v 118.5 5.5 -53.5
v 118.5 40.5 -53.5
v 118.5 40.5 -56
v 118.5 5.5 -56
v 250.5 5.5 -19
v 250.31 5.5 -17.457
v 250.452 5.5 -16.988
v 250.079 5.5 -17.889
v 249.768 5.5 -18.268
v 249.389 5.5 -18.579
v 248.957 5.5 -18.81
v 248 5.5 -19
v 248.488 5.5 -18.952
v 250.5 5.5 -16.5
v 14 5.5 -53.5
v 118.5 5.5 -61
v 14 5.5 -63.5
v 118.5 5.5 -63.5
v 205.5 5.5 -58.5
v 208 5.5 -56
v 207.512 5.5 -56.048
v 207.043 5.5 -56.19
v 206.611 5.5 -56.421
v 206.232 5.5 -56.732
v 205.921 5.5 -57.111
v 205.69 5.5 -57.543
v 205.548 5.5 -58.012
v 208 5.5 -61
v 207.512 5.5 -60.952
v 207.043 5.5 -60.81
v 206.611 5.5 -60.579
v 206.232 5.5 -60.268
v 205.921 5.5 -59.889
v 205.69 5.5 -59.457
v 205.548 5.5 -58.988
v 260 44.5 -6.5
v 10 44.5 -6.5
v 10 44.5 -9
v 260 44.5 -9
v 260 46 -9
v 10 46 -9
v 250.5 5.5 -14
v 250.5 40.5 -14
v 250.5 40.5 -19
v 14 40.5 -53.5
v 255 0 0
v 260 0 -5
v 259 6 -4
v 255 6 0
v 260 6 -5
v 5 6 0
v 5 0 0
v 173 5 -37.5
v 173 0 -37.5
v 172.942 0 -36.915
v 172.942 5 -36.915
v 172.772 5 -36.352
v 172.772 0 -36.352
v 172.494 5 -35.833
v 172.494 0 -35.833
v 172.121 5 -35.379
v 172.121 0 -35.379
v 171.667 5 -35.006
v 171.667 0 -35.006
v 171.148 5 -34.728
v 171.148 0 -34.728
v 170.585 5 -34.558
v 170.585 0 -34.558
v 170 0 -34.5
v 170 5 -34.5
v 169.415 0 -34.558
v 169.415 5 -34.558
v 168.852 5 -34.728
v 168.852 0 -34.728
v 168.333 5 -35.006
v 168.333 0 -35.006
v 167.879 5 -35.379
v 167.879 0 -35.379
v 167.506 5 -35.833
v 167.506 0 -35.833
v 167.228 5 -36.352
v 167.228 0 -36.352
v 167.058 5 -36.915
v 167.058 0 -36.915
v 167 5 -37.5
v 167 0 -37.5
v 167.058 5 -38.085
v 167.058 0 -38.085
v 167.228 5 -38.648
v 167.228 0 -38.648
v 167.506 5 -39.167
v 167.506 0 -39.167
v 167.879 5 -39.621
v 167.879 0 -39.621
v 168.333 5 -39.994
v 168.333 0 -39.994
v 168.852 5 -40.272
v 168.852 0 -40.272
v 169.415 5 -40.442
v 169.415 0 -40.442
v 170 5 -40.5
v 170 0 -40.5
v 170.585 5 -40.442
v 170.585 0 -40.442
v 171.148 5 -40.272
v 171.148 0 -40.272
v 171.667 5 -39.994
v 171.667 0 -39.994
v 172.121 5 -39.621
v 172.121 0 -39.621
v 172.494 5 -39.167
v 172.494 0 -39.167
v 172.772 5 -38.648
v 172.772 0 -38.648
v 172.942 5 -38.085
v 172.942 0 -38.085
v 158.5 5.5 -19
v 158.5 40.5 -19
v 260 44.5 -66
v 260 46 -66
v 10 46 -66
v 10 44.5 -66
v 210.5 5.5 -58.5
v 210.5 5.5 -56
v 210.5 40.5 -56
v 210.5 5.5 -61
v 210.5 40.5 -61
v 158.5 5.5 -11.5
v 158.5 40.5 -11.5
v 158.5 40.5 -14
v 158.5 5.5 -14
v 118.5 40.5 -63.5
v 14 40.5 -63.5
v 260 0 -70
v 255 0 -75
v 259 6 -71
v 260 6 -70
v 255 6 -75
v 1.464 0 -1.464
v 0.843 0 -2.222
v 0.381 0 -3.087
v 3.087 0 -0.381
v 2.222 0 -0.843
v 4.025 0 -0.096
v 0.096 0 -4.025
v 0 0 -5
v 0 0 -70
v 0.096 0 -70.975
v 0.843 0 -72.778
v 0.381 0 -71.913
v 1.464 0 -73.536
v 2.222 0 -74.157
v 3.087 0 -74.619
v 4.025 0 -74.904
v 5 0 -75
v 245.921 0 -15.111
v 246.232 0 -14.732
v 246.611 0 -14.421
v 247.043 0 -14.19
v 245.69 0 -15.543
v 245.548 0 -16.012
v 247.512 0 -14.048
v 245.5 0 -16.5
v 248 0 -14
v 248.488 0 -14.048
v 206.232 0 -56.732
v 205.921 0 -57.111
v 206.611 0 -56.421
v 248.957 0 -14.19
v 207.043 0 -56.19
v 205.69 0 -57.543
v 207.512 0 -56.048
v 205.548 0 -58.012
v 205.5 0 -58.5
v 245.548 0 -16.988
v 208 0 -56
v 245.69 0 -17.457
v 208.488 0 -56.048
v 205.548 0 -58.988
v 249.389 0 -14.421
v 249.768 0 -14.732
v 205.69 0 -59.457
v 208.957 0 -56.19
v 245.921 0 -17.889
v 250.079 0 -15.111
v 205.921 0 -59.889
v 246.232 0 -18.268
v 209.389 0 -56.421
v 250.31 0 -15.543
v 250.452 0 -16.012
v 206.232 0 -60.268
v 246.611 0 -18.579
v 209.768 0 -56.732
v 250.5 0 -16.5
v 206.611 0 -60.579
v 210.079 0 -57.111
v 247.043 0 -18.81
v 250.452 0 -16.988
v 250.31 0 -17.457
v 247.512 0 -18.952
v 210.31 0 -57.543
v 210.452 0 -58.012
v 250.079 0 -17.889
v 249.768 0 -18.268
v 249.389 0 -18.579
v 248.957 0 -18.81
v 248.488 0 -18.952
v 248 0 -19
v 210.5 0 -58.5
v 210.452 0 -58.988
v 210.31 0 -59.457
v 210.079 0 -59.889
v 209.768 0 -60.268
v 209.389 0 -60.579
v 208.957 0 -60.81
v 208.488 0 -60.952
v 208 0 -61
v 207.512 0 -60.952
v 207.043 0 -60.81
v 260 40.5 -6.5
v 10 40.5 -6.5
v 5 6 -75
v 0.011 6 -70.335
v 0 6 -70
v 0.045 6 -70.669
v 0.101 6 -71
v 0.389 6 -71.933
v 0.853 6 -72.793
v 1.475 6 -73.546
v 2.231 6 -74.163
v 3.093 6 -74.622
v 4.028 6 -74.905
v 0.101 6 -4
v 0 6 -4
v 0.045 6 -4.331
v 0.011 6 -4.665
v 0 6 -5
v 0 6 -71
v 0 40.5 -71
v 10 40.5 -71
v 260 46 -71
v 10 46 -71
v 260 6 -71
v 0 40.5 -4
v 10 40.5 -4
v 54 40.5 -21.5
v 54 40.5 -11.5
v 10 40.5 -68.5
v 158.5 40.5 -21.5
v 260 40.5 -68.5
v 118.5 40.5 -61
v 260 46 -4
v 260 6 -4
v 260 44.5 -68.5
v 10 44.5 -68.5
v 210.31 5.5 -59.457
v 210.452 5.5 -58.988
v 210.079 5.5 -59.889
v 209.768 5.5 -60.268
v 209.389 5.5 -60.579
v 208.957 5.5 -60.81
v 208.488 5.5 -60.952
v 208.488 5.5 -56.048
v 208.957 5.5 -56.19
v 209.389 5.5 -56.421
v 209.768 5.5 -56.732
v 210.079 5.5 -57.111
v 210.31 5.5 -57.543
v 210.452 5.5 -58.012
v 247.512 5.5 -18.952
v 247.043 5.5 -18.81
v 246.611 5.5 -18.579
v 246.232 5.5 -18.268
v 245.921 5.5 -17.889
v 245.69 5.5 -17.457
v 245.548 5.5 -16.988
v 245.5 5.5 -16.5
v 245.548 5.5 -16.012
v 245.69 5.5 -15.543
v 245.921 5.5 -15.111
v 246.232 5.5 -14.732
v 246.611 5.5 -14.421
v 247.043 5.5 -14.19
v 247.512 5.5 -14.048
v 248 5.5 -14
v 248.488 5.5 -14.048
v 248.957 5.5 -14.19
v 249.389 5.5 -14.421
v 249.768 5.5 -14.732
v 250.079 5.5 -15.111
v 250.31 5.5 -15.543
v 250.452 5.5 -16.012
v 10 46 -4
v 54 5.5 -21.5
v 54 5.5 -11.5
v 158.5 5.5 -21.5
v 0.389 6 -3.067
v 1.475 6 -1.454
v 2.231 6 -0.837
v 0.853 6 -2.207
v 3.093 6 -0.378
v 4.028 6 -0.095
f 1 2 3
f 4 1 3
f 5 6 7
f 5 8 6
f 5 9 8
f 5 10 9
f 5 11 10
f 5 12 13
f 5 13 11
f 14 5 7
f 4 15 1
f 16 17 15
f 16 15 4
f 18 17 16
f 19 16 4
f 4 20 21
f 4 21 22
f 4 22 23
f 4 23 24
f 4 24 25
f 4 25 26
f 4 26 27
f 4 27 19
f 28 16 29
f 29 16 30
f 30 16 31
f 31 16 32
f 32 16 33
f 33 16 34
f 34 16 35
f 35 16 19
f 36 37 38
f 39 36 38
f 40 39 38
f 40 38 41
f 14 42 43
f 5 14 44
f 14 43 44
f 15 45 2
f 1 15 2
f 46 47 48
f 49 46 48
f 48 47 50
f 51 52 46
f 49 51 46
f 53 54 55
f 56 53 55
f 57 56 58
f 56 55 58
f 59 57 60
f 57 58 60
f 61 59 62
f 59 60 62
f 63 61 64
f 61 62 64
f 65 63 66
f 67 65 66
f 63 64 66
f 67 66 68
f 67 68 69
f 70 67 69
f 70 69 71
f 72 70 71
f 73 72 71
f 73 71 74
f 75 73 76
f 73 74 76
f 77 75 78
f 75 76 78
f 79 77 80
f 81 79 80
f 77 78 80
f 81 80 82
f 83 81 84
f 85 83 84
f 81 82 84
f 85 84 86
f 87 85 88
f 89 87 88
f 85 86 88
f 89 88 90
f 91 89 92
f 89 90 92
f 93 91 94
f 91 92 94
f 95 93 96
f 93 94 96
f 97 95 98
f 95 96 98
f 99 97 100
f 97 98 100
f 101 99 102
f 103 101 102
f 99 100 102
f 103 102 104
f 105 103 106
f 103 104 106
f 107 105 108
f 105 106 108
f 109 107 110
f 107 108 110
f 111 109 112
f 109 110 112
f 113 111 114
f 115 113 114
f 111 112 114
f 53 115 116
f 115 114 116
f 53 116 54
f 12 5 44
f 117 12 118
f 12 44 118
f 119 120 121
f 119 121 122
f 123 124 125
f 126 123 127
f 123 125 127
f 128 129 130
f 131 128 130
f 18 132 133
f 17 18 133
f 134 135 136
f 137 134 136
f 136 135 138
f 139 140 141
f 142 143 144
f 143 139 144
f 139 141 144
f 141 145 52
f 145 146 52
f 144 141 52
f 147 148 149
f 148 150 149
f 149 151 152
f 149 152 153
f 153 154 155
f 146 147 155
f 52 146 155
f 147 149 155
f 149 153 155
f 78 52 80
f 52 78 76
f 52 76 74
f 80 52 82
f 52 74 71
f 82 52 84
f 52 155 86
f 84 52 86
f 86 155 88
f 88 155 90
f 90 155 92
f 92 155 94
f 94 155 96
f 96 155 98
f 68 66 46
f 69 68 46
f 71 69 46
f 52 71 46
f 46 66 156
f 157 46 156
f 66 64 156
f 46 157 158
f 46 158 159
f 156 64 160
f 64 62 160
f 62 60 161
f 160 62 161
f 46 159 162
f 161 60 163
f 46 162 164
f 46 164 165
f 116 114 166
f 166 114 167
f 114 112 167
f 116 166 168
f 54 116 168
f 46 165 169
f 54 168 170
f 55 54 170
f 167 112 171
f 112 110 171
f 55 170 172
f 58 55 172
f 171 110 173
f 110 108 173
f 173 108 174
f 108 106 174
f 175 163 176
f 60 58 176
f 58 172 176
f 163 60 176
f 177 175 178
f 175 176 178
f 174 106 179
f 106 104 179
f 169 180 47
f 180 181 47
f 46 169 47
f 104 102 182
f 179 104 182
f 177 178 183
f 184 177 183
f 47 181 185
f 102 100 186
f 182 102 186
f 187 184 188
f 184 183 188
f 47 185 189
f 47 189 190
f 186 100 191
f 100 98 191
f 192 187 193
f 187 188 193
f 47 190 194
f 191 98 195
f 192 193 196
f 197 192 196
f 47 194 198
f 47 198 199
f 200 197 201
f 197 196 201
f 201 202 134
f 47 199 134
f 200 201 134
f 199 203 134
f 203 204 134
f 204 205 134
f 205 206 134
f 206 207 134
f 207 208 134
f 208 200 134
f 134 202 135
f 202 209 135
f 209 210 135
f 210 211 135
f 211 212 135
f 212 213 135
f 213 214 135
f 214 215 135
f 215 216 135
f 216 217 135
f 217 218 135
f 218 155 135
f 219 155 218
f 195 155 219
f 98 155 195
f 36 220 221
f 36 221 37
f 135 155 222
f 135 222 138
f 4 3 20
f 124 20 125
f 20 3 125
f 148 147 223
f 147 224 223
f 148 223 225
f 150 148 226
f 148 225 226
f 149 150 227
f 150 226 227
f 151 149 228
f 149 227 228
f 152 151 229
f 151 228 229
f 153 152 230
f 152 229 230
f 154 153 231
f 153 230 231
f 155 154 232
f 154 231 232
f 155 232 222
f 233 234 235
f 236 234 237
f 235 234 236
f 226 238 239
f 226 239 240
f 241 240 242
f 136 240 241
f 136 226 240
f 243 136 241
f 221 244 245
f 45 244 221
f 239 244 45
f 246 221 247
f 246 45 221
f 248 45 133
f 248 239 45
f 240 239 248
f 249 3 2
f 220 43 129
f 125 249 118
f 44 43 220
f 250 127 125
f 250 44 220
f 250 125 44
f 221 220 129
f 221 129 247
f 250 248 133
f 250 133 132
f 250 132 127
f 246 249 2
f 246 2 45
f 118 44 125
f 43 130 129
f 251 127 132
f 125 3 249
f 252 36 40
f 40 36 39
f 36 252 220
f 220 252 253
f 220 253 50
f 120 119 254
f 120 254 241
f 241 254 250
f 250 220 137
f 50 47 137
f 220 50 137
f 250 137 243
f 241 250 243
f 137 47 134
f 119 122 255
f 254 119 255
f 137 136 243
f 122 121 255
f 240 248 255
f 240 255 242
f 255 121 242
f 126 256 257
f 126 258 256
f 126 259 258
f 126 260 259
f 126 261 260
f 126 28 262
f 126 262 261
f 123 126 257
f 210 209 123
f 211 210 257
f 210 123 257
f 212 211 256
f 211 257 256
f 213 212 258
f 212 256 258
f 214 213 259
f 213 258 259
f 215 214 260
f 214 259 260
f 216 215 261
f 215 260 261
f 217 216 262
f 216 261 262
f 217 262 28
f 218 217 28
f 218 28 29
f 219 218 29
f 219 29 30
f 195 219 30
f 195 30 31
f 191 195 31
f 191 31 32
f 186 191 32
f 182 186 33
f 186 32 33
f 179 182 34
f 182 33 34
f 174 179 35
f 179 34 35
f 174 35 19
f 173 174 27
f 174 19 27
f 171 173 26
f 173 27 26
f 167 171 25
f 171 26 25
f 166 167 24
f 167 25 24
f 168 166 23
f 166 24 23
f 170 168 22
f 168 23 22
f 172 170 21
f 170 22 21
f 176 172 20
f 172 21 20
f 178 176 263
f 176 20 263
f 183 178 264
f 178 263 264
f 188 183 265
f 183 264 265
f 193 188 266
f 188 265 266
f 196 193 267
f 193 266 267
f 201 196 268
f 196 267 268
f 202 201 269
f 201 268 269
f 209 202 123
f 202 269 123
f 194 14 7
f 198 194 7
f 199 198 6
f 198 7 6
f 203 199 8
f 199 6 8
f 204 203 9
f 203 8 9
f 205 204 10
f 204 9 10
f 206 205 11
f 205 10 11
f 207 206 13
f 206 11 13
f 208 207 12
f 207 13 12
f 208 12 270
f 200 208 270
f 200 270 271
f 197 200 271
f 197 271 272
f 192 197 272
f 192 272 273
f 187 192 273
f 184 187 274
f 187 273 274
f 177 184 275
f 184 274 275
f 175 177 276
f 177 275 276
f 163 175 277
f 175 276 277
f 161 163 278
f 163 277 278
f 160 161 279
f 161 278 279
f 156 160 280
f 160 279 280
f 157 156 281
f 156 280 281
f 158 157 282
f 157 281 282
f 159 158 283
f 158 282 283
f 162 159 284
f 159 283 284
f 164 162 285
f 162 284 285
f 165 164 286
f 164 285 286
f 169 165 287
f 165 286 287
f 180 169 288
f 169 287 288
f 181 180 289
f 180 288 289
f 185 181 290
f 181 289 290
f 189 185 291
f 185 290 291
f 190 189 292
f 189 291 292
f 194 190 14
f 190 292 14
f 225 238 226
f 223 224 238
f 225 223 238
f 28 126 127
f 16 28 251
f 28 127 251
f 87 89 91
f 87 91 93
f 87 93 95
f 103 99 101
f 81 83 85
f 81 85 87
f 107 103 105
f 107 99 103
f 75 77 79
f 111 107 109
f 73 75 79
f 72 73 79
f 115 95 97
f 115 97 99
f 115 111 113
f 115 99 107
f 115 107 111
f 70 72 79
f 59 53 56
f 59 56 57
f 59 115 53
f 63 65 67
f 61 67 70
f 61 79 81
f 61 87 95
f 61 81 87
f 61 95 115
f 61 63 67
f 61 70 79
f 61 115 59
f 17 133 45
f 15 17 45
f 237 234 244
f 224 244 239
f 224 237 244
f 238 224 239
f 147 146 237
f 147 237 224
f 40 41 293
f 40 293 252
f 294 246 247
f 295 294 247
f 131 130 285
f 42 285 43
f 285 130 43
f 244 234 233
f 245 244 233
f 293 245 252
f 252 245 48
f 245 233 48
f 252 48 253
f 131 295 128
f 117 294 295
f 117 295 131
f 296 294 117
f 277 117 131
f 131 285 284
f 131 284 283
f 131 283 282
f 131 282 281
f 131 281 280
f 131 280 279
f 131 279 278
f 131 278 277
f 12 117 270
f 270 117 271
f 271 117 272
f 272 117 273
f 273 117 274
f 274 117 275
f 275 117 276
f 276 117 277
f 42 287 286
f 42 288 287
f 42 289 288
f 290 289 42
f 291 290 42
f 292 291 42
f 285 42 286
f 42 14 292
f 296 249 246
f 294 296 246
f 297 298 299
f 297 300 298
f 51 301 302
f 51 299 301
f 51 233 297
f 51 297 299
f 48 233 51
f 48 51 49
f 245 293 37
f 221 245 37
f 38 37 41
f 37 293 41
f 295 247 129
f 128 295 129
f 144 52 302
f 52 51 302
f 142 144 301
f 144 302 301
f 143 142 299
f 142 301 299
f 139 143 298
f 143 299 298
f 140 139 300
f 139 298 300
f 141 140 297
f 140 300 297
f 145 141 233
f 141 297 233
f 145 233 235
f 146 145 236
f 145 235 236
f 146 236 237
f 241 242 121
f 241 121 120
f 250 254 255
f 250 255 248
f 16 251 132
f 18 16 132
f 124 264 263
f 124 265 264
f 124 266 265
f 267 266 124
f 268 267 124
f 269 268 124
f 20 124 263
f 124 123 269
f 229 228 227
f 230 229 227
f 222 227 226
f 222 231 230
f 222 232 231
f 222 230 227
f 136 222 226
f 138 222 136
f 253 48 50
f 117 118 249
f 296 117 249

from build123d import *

# Parameters (mm, degrees)
SKETCH1_W           = 260
SKETCH1_H           = 75
BOSS_EXTRUDE1_DEPTH = 6
CHAMFER1_SIZE       = 5
FILLET1_R           = 5
SKETCH2_W           = 260
SKETCH2_H           = 67
BOSS_EXTRUDE2_DEPTH = 40
CUT_EXTRUDE1_DEPTH  = 261
SKETCH4_W           = 10
SKETCH4_H           = 67
CUT_EXTRUDE3_DEPTH  = 5.5
CUT_EXTRUDE4_DEPTH  = 35
SKETCH6_R           = 2.5
CUT_EXTRUDE5_DEPTH  = 6.5
SKETCH7_R           = 3
CUT_EXTRUDE6_DEPTH  = 5


with BuildPart() as part:
    # Sketch1 → Boss-Extrude1 (new body)
    with BuildSketch(Plane(origin=(0, 0, 0), x_dir=(1, 0, 0), z_dir=(0, 1, 0))):
        with Locations((130, 37.5)):
            Rectangle(SKETCH1_W, SKETCH1_H)
    extrude(amount=BOSS_EXTRUDE1_DEPTH)

    # Chamfer1
    chamfer1_edges = [part.edges().sort_by_distance(p)[0] for p in [
        (260, 3, -75),
        (260, 3, 0),
    ]]
    chamfer(chamfer1_edges, length=CHAMFER1_SIZE)

    # Fillet1
    fillet1_edges = [part.edges().sort_by_distance(p)[0] for p in [
        (0, 3, -75),
        (0, 3, 0),
    ]]
    fillet(fillet1_edges, radius=FILLET1_R)

    # Sketch2 → Boss-Extrude2 (add)
    with BuildSketch(Plane(origin=(0, 6, 0), x_dir=(1, 0, 0), z_dir=(0, 1, 0))):
        with Locations((130, 37.5)):
            Rectangle(SKETCH2_W, SKETCH2_H)
    extrude(amount=BOSS_EXTRUDE2_DEPTH)

    # Sketch3 → Cut-Extrude1 (cut, through all)
    with BuildSketch(Plane.ZY):
        Polygon((-66, 46), (-66, 44.5), (-68.5, 44.5), (-68.5, 40.5), (-6.5, 40.5), (-6.5, 44.5), (-9, 44.5), (-9, 46), align=None)
    extrude(amount=-CUT_EXTRUDE1_DEPTH, mode=Mode.SUBTRACT)

    # Sketch4 → Cut-Extrude3 (cut)
    with BuildSketch(Plane(origin=(0, 46, 0), x_dir=(1, 0, 0), z_dir=(0, 1, 0))):
        with Locations((5, 37.5)):
            Rectangle(SKETCH4_W, SKETCH4_H)
    extrude(amount=-CUT_EXTRUDE3_DEPTH, mode=Mode.SUBTRACT)

    # Sketch5 → Cut-Extrude4 (cut)
    with BuildSketch(Plane(origin=(0, 40.5, 0), x_dir=(1, 0, 0), z_dir=(0, 1, 0))):
        Polygon((14, 63.5), (14, 53.5), (118.5, 53.5), (118.5, 56), (210.5, 56), (210.5, 61), (118.5, 61), (118.5, 63.5), align=None)
        Polygon((54, 21.5), (54, 11.5), (158.5, 11.5), (158.5, 14), (250.5, 14), (250.5, 19), (158.5, 19), (158.5, 21.5), align=None)
    extrude(amount=-CUT_EXTRUDE4_DEPTH, mode=Mode.SUBTRACT)

    # Sketch6 → Cut-Extrude5 (cut, through all)
    with BuildSketch(Plane(origin=(0, 5.5, 0), x_dir=(1, 0, 0), z_dir=(0, 1, 0))):
        with Locations((208, 58.5)):
            Circle(SKETCH6_R)
        with Locations((248, 16.5)):
            Circle(SKETCH6_R)
    extrude(amount=-CUT_EXTRUDE5_DEPTH, mode=Mode.SUBTRACT)

    # Sketch7 → Cut-Extrude6 (cut)
    with BuildSketch(Plane.XZ):
        with Locations((170, -37.5)):
            Circle(SKETCH7_R)
    extrude(amount=-CUT_EXTRUDE6_DEPTH, mode=Mode.SUBTRACT)


solid = part.part
